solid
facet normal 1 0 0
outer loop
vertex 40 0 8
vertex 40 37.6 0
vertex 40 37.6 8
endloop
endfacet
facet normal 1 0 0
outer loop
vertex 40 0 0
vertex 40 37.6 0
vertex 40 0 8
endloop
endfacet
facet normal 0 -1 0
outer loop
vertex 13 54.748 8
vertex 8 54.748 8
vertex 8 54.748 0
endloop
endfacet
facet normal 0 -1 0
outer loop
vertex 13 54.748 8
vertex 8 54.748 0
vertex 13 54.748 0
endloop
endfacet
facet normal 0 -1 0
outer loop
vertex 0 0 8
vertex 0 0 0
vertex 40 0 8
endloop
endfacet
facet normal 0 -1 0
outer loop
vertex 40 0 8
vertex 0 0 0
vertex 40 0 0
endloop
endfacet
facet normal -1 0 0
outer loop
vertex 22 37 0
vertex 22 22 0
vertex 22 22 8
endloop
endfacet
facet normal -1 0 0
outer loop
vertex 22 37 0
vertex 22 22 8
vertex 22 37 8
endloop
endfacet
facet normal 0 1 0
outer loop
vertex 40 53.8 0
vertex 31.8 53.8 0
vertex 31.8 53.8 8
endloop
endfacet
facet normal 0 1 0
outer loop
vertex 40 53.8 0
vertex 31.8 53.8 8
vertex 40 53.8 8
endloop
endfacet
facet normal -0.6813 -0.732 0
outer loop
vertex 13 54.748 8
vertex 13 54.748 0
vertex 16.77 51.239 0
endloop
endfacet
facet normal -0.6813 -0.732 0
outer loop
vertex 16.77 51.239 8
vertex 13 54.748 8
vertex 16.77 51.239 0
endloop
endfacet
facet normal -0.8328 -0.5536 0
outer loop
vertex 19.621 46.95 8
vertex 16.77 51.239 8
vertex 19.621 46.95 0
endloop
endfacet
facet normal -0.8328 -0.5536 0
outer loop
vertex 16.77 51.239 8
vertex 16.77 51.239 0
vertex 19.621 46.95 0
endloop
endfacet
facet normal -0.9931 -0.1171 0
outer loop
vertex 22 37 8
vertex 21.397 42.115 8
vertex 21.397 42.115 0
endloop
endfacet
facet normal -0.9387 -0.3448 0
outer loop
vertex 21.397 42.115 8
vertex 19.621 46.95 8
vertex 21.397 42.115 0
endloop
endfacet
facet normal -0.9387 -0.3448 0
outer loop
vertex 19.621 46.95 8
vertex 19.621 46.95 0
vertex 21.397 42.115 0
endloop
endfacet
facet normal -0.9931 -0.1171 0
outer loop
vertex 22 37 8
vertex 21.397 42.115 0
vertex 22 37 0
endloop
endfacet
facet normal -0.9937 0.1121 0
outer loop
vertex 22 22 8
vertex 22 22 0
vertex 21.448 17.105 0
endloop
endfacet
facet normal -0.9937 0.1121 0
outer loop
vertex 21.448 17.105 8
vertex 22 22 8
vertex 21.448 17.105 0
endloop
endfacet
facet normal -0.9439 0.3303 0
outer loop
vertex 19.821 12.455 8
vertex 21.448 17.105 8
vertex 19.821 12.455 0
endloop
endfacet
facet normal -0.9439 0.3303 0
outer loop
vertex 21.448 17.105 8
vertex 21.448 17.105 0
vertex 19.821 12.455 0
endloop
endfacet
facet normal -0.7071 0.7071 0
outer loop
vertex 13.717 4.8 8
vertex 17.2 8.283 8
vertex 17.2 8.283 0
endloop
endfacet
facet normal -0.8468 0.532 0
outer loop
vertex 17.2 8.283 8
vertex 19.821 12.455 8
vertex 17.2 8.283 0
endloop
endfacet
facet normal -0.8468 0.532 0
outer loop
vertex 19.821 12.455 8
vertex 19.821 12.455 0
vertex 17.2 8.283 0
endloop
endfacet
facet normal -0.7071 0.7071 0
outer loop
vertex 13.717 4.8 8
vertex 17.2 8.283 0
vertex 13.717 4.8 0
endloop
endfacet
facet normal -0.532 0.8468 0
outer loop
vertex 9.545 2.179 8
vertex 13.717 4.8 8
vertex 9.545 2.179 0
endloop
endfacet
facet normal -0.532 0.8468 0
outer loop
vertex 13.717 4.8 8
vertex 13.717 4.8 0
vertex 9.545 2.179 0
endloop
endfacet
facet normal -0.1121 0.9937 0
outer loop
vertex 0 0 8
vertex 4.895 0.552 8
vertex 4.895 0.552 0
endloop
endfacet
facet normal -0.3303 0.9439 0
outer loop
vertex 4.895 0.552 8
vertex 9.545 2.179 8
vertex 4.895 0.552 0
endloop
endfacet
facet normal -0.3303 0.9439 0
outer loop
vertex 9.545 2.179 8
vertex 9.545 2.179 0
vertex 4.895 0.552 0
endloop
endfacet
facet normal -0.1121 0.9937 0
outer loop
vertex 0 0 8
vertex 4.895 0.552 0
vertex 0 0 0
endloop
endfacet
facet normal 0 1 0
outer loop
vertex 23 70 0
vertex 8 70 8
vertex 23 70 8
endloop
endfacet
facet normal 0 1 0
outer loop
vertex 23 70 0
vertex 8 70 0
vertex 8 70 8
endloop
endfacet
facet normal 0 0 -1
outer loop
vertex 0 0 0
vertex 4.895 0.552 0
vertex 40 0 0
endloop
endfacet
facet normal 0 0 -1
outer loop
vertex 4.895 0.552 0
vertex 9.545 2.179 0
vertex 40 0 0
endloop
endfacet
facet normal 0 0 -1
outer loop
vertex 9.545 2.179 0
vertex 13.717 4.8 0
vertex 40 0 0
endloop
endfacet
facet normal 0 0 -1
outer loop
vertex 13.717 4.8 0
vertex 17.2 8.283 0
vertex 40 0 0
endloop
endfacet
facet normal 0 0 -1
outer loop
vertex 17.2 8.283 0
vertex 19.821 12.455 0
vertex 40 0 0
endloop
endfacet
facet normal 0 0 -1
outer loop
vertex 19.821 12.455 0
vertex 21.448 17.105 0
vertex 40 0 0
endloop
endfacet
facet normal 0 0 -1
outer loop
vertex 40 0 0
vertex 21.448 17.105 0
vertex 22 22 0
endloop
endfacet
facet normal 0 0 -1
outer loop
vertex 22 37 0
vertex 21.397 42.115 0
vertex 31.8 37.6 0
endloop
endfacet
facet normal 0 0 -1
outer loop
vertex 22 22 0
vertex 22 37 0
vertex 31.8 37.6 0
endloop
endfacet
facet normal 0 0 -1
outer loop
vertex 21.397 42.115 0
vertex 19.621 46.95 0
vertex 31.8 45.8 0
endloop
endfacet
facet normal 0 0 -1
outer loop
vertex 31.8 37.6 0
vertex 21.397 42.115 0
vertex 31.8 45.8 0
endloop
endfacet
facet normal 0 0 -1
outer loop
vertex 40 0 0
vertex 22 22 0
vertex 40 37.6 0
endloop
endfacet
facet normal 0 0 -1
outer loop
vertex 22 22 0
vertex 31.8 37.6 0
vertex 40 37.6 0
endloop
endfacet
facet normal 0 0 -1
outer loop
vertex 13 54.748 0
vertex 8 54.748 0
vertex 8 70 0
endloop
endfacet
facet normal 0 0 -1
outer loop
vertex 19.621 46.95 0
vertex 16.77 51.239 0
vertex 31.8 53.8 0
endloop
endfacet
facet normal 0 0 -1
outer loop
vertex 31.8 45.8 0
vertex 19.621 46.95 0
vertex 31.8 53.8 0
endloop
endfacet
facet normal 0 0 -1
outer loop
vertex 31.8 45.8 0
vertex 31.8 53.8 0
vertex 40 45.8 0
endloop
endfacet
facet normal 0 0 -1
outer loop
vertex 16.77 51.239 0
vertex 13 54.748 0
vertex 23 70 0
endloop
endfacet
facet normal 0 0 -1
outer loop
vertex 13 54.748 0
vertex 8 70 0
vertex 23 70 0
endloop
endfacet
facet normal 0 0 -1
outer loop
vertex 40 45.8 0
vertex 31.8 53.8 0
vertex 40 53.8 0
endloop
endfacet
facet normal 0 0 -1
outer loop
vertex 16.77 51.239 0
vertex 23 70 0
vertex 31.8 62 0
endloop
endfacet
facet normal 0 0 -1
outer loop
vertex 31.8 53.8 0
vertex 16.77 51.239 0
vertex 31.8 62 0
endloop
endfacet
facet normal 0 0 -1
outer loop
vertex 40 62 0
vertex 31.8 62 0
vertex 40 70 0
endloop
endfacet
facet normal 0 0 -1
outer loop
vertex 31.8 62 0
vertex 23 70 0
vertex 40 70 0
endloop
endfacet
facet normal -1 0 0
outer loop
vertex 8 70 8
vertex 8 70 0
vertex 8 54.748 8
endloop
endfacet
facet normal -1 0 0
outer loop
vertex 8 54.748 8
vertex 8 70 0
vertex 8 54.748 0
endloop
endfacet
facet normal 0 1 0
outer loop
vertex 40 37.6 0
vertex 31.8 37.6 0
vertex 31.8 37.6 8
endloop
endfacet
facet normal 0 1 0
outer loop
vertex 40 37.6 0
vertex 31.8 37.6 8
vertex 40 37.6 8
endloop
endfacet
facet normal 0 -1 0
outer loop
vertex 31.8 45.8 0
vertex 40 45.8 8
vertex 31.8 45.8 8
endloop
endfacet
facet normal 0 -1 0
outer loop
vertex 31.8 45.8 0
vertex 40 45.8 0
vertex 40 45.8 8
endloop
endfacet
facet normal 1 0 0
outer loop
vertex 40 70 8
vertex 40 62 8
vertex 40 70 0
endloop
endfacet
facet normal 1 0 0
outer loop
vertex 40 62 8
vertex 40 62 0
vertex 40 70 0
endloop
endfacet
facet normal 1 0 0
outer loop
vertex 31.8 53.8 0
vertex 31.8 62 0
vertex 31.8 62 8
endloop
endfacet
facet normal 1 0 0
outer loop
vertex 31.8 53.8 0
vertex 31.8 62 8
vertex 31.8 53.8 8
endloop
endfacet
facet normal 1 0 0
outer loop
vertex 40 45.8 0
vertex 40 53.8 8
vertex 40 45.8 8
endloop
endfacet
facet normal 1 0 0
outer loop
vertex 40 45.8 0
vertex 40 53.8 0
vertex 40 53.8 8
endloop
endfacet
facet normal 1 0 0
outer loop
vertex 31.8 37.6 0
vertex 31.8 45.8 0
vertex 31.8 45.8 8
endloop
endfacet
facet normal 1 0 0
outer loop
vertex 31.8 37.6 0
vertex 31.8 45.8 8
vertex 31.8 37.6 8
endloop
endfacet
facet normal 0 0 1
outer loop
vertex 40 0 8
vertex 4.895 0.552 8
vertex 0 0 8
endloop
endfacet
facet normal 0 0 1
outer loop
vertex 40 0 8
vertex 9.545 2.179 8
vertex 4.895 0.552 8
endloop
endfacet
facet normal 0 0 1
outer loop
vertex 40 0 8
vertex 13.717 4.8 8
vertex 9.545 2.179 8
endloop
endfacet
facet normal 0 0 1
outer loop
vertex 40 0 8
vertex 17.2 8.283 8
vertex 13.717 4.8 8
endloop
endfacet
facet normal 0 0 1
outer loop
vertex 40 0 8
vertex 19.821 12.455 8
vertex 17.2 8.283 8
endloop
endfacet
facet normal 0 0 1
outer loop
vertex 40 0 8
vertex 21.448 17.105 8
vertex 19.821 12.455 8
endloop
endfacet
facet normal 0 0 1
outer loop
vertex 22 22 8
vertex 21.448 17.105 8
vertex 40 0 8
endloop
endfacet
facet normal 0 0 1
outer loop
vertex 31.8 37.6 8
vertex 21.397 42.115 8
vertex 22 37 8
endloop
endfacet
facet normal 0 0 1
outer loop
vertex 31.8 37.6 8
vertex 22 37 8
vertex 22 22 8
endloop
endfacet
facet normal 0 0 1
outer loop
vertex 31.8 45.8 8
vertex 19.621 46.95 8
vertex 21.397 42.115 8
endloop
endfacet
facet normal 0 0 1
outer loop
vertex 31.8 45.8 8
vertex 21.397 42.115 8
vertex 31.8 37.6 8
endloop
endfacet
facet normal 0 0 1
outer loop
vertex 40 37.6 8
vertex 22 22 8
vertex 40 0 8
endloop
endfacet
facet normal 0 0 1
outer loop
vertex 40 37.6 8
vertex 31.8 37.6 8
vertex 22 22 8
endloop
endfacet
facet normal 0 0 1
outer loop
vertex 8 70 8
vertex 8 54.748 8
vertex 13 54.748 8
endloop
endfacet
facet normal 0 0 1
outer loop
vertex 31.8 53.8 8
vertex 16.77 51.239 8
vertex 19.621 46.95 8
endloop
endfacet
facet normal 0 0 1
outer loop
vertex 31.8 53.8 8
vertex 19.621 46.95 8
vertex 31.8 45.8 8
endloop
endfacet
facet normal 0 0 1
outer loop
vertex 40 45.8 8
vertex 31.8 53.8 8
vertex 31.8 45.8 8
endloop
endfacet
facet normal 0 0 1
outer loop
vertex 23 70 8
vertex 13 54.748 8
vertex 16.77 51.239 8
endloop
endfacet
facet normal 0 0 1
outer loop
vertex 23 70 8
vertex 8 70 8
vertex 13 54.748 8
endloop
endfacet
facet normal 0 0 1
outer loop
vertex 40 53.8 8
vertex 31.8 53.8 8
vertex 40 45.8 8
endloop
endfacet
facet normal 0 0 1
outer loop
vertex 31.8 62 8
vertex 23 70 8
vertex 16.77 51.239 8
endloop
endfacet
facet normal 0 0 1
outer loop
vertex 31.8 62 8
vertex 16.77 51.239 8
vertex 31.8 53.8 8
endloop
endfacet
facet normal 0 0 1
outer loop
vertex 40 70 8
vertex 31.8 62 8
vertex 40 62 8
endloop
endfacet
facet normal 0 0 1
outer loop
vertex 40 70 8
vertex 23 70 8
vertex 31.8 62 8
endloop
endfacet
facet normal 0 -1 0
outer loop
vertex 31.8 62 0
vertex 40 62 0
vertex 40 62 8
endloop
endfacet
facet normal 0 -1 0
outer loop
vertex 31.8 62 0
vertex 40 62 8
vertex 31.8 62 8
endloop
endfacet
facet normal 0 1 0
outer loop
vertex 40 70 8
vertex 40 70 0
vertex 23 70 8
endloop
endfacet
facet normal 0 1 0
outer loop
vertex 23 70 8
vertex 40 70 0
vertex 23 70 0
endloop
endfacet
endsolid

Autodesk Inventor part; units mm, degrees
ref_plane "YZ Plane" through (0, 0, 0) normal (1, 0, 0) x (0, 1, 0)
ref_plane "XZ Plane" through (0, 0, 0) normal (0, 1, 0) x (-1, 0, 0)
ref_plane "XY Plane" through (0, 0, 0) normal (0, 0, 1) x (1, 0, 0)
sketch "Sketch1" plane through (0, 0, 0) normal (0, 0, 1) x (1, 0, 0)
  arc A0 (0, 0) -> (22, 22) centre (0, 22) ccw
  line L0 (22, 22) -> (22, 37)
  arc A1 (22, 37) -> (13, 54.7482) centre (0, 37) ccw
  line L1 (13, 54.7482) -> (13, 54.7482)
  line L2 (8, 70) -> (23, 70)
  line L3 (40, 62) -> (31.8, 62)
  line L4 (31.8, 62) -> (31.8, 53.8)
  line L5 (31.8, 53.8) -> (40, 53.8)
  line L6 (40, 45.8) -> (31.8, 45.8)
  line L7 (31.8, 45.8) -> (31.8, 37.6)
  line L8 (31.8, 37.6) -> (40, 37.6)
  line L9 (40, 53.8) -> (40, 45.8)
  line L10 (40, 37.6) -> (40, 0)
  line L11 (40, 62) -> (40, 70)
  line L12 (40, 70) -> (23, 70)
  line L13 (23, 70) -> (23, 70)
  line L14 (8, 70) -> (8, 54.7482)
  line L15 (8, 54.7482) -> (13, 54.7482)
  line L16 (0, 0) -> (40, 0)
  point P0 (40, 66)
  dimension "d0" = 22
  dimension "d1" = 90
  dimension "d2" = 0
  dimension "d3" = 15
  dimension "d4" = 0
  dimension "d5" = 13
  dimension "d6" = 22
  dimension "d7" = 0
  dimension "d14" = 8.2
  dimension "d15" = 8.2
  dimension "d32" = 8
  dimension "d34" = 8
  dimension "d35" = 8
  dimension "d37" = 15
  dimension "d39" = 40
  dimension "d40" = 0
  dimension "d41" = 0
  dimension "d42" = 0
  dimension "d43" = 8.2
  dimension "d44" = 70
extrude "Extrusion2" add sketch "Sketch1" along normal blind 8
properties part number "CenterFinger"
